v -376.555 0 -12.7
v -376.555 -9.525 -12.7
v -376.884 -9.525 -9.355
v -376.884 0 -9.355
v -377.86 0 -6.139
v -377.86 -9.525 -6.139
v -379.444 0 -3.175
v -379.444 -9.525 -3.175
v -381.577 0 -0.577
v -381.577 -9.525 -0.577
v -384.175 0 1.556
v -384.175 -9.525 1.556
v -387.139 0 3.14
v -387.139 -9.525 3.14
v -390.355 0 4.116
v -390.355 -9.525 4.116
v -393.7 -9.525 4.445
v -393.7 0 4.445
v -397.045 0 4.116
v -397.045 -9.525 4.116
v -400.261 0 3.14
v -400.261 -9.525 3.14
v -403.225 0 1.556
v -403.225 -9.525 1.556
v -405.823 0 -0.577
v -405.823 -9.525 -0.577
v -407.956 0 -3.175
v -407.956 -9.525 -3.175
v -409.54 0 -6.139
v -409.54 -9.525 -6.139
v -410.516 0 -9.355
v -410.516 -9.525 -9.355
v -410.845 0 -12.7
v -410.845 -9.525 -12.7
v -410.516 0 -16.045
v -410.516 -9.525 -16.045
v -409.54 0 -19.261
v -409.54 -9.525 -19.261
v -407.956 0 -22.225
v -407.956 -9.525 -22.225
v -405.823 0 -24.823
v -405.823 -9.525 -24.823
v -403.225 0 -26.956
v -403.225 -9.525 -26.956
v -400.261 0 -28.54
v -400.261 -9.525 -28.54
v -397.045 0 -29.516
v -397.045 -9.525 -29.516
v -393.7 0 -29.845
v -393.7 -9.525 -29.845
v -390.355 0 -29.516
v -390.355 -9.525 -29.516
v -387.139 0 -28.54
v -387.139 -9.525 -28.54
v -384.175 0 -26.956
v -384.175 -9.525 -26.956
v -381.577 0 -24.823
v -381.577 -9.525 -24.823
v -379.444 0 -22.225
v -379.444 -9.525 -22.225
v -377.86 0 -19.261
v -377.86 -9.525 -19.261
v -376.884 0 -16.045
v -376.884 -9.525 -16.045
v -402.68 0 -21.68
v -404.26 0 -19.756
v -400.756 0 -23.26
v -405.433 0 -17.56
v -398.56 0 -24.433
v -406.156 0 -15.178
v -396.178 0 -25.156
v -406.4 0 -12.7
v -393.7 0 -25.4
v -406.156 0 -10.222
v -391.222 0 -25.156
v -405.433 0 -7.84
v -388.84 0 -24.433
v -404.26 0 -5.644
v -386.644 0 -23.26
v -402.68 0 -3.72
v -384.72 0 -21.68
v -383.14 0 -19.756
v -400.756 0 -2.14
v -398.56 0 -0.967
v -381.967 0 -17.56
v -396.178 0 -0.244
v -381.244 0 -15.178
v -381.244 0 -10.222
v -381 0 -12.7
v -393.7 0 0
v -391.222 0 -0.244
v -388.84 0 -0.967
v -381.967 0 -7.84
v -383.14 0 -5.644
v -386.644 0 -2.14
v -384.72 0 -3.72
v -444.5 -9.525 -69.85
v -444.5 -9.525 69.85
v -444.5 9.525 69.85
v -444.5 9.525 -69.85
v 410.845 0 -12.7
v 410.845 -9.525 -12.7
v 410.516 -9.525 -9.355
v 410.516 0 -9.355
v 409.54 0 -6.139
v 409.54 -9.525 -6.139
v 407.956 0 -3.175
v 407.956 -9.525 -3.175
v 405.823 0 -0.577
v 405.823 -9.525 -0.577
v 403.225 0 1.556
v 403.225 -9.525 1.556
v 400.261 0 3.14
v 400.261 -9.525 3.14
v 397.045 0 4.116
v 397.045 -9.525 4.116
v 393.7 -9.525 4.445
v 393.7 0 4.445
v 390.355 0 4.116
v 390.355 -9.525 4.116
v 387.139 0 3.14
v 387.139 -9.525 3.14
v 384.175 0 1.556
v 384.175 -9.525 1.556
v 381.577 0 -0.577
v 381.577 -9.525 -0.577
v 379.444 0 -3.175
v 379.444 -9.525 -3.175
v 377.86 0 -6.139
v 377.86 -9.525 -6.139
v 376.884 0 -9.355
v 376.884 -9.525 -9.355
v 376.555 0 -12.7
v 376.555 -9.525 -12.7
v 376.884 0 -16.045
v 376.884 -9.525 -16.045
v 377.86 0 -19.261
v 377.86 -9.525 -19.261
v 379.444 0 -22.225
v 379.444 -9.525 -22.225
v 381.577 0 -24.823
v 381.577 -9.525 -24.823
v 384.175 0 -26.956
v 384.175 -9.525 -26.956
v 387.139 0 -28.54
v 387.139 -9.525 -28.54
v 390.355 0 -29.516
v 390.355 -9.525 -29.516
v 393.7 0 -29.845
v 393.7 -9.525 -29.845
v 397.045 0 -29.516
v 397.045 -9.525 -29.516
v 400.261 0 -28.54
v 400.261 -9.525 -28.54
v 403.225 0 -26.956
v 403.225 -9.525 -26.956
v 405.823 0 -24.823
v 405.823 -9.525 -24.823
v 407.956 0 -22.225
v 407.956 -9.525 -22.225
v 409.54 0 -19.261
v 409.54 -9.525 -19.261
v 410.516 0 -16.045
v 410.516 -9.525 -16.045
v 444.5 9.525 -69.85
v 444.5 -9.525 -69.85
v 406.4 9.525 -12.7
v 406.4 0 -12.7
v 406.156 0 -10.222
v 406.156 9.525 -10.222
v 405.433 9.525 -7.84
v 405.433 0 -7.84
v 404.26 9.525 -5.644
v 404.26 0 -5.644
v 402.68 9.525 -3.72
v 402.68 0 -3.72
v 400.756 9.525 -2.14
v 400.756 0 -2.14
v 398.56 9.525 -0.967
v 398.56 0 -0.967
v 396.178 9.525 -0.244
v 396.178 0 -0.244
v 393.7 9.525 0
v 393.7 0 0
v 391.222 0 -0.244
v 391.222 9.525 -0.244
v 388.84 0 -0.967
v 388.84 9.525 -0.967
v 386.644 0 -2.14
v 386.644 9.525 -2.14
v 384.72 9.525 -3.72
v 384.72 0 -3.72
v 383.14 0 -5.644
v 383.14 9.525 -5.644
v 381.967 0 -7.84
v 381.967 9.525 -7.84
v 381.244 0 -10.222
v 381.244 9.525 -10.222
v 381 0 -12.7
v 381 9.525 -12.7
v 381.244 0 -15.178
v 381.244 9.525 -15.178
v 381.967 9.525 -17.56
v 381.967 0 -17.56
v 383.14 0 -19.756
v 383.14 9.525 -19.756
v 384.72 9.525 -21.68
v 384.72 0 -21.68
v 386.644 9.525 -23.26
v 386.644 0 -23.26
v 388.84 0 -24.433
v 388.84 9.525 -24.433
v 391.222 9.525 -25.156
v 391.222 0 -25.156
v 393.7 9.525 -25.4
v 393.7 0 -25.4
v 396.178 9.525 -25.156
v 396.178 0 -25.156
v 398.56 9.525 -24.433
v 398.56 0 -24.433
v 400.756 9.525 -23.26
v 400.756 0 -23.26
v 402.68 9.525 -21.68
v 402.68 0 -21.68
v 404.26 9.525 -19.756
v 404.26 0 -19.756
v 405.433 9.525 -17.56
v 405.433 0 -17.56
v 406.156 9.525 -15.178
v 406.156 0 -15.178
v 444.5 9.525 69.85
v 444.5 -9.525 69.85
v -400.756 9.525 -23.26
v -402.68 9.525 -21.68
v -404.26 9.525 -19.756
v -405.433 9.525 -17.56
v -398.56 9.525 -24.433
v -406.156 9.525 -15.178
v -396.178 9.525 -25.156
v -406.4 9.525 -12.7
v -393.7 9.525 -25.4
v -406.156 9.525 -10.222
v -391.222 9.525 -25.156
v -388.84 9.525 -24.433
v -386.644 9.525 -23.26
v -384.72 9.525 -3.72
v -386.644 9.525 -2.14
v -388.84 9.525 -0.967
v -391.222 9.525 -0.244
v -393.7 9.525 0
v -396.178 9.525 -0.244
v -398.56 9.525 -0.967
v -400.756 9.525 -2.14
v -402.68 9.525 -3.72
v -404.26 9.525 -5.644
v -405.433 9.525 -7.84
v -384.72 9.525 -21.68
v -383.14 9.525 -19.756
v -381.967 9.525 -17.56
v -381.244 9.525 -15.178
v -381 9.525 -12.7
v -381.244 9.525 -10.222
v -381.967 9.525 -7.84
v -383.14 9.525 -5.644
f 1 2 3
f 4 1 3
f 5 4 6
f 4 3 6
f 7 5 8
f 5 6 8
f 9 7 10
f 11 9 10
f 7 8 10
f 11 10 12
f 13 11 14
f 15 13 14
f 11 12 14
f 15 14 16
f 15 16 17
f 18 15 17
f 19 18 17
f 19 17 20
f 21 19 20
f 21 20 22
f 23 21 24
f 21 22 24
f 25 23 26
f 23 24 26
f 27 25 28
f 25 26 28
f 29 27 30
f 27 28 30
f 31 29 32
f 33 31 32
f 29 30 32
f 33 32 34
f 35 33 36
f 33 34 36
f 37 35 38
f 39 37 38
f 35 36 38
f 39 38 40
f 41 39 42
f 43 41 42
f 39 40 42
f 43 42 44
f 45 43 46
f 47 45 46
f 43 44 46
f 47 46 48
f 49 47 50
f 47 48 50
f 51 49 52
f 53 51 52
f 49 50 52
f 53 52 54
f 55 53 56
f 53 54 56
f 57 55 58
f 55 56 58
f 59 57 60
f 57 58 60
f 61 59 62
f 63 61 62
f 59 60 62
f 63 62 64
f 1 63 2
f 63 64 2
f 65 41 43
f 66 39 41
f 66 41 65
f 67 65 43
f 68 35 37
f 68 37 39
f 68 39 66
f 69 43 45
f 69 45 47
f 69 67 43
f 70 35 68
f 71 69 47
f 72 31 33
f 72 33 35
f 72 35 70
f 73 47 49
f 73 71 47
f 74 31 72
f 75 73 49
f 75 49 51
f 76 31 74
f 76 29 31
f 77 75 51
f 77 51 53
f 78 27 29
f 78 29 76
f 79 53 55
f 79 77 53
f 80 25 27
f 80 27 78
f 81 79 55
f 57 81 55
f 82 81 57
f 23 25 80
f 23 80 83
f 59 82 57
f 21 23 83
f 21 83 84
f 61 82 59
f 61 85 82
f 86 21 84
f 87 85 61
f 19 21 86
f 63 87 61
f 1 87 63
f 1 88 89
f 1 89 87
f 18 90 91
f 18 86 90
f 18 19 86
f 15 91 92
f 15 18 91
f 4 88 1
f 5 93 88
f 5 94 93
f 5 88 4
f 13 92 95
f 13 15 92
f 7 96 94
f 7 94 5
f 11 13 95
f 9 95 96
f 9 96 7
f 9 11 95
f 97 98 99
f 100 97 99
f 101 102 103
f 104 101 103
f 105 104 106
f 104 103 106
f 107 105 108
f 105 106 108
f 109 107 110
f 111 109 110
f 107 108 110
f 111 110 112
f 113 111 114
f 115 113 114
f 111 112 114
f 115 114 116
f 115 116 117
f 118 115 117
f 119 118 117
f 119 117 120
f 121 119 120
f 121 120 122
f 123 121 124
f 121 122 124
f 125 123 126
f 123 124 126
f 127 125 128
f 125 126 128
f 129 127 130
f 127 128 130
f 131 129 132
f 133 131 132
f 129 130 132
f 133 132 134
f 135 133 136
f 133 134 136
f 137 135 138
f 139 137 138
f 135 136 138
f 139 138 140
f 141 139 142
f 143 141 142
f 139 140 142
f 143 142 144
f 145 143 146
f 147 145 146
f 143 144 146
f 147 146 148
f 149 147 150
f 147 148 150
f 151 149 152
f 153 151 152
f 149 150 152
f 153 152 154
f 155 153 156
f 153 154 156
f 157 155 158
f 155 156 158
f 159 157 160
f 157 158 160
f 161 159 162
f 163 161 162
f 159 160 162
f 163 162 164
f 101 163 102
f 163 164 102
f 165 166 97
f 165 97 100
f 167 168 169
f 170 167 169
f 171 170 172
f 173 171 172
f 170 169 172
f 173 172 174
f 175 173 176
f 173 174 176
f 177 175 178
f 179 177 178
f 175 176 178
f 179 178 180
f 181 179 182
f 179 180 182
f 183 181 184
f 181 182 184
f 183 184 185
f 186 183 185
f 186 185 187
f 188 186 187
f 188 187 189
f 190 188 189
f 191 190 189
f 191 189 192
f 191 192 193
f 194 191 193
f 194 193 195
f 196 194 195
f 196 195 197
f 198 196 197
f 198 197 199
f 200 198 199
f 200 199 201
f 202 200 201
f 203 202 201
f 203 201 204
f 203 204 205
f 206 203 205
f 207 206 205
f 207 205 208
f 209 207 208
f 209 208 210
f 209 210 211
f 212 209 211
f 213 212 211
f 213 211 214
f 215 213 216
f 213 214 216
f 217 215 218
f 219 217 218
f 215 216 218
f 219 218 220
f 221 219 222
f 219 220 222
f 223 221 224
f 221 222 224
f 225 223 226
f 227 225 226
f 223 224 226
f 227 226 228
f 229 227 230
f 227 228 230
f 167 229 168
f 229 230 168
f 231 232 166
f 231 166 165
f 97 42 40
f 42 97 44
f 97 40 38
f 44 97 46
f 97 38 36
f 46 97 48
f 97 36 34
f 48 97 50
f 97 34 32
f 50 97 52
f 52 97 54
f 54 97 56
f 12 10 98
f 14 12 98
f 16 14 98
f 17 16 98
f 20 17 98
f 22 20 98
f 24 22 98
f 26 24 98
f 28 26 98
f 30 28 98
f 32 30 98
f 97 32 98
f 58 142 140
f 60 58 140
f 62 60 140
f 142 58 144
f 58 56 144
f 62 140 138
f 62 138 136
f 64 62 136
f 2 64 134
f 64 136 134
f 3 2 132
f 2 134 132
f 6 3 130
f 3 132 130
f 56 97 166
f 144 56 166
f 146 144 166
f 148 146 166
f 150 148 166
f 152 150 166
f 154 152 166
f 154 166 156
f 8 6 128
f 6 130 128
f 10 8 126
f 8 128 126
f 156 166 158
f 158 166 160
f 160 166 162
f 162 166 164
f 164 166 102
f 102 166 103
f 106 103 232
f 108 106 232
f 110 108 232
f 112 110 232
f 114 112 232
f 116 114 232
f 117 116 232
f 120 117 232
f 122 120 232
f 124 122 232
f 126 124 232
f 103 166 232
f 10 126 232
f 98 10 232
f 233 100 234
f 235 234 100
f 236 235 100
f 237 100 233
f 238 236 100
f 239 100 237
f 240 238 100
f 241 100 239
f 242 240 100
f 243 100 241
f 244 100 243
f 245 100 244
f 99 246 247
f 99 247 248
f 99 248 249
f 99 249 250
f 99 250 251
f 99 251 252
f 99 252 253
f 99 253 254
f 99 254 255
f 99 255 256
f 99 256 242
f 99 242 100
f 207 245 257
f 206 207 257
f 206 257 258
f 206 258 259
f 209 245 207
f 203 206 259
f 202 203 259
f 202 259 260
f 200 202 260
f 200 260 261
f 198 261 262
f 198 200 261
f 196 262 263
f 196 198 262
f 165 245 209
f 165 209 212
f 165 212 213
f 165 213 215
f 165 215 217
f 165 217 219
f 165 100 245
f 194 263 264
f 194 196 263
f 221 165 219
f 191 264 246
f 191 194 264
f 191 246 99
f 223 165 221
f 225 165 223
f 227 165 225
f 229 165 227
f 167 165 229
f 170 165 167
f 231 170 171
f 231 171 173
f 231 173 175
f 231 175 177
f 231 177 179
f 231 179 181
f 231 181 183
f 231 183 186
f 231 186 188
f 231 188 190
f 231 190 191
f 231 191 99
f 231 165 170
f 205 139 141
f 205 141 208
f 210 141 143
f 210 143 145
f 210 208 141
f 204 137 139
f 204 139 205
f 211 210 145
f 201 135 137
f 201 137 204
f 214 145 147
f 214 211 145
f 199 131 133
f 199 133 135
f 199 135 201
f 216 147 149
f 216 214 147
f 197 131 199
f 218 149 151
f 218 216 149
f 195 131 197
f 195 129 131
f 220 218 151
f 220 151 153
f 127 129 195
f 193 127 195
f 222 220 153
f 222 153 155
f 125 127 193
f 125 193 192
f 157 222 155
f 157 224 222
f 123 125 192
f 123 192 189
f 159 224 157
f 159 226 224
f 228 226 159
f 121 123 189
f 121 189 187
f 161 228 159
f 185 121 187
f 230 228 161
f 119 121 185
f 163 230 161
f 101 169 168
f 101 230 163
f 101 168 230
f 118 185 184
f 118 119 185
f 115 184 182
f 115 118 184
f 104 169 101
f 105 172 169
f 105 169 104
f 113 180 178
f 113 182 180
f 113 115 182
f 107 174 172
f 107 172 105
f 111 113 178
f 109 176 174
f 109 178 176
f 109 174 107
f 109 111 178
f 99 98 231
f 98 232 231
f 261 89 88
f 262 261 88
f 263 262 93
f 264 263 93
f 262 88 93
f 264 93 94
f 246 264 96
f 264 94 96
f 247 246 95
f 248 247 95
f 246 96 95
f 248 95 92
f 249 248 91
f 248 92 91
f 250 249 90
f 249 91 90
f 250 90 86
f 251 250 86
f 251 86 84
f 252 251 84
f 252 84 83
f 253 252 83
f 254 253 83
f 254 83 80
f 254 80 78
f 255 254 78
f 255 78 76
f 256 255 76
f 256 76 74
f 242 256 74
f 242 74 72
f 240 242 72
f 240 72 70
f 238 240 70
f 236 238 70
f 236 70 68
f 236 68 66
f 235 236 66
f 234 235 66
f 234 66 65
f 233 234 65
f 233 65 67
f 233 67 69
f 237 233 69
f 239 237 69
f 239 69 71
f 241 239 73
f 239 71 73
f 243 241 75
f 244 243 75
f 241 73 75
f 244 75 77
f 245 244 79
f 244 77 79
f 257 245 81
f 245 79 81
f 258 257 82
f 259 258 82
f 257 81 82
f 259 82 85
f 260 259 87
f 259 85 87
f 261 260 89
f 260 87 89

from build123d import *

# Parameters (mm, degrees)
F0_W     = 19.05
F0_H     = 139.7
F1_DEPTH = 444.5
F2_R     = 12.7
F3_DEPTH = 19.051
F4_R     = 17.145
F4_R_2   = 12.7
F5_DEPTH = 9.525


with BuildPart() as f1:
    # F0 (on Right) → F1 (new body, symmetric)
    with BuildSketch(Plane.YZ):
        Rectangle(F0_W, F0_H)
    extrude(amount=F1_DEPTH, both=True)

    # F2 (on face) → F3 (cut, through all)
    with BuildSketch(Plane.XZ.offset(9.525)):
        with Locations((-393.7, -12.7)):
            Circle(F2_R)
        with Locations((393.7, -12.7)):
            Circle(F2_R)
    extrude(amount=-F3_DEPTH, mode=Mode.SUBTRACT)

    # F4 (on face) → F5 (cut)
    with BuildSketch(Plane.XZ.offset(9.525)):
        with Locations((-393.7, -12.7)):
            Circle(F4_R)
        with Locations((-393.7, -12.7)):
            Circle(F4_R_2, mode=Mode.SUBTRACT)
        with Locations((393.7, -12.7)):
            Circle(F4_R)
        with Locations((393.7, -12.7)):
            Circle(F4_R_2, mode=Mode.SUBTRACT)
        with Locations((-393.7, -12.7)):
            Circle(F4_R_2)
    extrude(amount=-F5_DEPTH, mode=Mode.SUBTRACT)


solid = f1.part
